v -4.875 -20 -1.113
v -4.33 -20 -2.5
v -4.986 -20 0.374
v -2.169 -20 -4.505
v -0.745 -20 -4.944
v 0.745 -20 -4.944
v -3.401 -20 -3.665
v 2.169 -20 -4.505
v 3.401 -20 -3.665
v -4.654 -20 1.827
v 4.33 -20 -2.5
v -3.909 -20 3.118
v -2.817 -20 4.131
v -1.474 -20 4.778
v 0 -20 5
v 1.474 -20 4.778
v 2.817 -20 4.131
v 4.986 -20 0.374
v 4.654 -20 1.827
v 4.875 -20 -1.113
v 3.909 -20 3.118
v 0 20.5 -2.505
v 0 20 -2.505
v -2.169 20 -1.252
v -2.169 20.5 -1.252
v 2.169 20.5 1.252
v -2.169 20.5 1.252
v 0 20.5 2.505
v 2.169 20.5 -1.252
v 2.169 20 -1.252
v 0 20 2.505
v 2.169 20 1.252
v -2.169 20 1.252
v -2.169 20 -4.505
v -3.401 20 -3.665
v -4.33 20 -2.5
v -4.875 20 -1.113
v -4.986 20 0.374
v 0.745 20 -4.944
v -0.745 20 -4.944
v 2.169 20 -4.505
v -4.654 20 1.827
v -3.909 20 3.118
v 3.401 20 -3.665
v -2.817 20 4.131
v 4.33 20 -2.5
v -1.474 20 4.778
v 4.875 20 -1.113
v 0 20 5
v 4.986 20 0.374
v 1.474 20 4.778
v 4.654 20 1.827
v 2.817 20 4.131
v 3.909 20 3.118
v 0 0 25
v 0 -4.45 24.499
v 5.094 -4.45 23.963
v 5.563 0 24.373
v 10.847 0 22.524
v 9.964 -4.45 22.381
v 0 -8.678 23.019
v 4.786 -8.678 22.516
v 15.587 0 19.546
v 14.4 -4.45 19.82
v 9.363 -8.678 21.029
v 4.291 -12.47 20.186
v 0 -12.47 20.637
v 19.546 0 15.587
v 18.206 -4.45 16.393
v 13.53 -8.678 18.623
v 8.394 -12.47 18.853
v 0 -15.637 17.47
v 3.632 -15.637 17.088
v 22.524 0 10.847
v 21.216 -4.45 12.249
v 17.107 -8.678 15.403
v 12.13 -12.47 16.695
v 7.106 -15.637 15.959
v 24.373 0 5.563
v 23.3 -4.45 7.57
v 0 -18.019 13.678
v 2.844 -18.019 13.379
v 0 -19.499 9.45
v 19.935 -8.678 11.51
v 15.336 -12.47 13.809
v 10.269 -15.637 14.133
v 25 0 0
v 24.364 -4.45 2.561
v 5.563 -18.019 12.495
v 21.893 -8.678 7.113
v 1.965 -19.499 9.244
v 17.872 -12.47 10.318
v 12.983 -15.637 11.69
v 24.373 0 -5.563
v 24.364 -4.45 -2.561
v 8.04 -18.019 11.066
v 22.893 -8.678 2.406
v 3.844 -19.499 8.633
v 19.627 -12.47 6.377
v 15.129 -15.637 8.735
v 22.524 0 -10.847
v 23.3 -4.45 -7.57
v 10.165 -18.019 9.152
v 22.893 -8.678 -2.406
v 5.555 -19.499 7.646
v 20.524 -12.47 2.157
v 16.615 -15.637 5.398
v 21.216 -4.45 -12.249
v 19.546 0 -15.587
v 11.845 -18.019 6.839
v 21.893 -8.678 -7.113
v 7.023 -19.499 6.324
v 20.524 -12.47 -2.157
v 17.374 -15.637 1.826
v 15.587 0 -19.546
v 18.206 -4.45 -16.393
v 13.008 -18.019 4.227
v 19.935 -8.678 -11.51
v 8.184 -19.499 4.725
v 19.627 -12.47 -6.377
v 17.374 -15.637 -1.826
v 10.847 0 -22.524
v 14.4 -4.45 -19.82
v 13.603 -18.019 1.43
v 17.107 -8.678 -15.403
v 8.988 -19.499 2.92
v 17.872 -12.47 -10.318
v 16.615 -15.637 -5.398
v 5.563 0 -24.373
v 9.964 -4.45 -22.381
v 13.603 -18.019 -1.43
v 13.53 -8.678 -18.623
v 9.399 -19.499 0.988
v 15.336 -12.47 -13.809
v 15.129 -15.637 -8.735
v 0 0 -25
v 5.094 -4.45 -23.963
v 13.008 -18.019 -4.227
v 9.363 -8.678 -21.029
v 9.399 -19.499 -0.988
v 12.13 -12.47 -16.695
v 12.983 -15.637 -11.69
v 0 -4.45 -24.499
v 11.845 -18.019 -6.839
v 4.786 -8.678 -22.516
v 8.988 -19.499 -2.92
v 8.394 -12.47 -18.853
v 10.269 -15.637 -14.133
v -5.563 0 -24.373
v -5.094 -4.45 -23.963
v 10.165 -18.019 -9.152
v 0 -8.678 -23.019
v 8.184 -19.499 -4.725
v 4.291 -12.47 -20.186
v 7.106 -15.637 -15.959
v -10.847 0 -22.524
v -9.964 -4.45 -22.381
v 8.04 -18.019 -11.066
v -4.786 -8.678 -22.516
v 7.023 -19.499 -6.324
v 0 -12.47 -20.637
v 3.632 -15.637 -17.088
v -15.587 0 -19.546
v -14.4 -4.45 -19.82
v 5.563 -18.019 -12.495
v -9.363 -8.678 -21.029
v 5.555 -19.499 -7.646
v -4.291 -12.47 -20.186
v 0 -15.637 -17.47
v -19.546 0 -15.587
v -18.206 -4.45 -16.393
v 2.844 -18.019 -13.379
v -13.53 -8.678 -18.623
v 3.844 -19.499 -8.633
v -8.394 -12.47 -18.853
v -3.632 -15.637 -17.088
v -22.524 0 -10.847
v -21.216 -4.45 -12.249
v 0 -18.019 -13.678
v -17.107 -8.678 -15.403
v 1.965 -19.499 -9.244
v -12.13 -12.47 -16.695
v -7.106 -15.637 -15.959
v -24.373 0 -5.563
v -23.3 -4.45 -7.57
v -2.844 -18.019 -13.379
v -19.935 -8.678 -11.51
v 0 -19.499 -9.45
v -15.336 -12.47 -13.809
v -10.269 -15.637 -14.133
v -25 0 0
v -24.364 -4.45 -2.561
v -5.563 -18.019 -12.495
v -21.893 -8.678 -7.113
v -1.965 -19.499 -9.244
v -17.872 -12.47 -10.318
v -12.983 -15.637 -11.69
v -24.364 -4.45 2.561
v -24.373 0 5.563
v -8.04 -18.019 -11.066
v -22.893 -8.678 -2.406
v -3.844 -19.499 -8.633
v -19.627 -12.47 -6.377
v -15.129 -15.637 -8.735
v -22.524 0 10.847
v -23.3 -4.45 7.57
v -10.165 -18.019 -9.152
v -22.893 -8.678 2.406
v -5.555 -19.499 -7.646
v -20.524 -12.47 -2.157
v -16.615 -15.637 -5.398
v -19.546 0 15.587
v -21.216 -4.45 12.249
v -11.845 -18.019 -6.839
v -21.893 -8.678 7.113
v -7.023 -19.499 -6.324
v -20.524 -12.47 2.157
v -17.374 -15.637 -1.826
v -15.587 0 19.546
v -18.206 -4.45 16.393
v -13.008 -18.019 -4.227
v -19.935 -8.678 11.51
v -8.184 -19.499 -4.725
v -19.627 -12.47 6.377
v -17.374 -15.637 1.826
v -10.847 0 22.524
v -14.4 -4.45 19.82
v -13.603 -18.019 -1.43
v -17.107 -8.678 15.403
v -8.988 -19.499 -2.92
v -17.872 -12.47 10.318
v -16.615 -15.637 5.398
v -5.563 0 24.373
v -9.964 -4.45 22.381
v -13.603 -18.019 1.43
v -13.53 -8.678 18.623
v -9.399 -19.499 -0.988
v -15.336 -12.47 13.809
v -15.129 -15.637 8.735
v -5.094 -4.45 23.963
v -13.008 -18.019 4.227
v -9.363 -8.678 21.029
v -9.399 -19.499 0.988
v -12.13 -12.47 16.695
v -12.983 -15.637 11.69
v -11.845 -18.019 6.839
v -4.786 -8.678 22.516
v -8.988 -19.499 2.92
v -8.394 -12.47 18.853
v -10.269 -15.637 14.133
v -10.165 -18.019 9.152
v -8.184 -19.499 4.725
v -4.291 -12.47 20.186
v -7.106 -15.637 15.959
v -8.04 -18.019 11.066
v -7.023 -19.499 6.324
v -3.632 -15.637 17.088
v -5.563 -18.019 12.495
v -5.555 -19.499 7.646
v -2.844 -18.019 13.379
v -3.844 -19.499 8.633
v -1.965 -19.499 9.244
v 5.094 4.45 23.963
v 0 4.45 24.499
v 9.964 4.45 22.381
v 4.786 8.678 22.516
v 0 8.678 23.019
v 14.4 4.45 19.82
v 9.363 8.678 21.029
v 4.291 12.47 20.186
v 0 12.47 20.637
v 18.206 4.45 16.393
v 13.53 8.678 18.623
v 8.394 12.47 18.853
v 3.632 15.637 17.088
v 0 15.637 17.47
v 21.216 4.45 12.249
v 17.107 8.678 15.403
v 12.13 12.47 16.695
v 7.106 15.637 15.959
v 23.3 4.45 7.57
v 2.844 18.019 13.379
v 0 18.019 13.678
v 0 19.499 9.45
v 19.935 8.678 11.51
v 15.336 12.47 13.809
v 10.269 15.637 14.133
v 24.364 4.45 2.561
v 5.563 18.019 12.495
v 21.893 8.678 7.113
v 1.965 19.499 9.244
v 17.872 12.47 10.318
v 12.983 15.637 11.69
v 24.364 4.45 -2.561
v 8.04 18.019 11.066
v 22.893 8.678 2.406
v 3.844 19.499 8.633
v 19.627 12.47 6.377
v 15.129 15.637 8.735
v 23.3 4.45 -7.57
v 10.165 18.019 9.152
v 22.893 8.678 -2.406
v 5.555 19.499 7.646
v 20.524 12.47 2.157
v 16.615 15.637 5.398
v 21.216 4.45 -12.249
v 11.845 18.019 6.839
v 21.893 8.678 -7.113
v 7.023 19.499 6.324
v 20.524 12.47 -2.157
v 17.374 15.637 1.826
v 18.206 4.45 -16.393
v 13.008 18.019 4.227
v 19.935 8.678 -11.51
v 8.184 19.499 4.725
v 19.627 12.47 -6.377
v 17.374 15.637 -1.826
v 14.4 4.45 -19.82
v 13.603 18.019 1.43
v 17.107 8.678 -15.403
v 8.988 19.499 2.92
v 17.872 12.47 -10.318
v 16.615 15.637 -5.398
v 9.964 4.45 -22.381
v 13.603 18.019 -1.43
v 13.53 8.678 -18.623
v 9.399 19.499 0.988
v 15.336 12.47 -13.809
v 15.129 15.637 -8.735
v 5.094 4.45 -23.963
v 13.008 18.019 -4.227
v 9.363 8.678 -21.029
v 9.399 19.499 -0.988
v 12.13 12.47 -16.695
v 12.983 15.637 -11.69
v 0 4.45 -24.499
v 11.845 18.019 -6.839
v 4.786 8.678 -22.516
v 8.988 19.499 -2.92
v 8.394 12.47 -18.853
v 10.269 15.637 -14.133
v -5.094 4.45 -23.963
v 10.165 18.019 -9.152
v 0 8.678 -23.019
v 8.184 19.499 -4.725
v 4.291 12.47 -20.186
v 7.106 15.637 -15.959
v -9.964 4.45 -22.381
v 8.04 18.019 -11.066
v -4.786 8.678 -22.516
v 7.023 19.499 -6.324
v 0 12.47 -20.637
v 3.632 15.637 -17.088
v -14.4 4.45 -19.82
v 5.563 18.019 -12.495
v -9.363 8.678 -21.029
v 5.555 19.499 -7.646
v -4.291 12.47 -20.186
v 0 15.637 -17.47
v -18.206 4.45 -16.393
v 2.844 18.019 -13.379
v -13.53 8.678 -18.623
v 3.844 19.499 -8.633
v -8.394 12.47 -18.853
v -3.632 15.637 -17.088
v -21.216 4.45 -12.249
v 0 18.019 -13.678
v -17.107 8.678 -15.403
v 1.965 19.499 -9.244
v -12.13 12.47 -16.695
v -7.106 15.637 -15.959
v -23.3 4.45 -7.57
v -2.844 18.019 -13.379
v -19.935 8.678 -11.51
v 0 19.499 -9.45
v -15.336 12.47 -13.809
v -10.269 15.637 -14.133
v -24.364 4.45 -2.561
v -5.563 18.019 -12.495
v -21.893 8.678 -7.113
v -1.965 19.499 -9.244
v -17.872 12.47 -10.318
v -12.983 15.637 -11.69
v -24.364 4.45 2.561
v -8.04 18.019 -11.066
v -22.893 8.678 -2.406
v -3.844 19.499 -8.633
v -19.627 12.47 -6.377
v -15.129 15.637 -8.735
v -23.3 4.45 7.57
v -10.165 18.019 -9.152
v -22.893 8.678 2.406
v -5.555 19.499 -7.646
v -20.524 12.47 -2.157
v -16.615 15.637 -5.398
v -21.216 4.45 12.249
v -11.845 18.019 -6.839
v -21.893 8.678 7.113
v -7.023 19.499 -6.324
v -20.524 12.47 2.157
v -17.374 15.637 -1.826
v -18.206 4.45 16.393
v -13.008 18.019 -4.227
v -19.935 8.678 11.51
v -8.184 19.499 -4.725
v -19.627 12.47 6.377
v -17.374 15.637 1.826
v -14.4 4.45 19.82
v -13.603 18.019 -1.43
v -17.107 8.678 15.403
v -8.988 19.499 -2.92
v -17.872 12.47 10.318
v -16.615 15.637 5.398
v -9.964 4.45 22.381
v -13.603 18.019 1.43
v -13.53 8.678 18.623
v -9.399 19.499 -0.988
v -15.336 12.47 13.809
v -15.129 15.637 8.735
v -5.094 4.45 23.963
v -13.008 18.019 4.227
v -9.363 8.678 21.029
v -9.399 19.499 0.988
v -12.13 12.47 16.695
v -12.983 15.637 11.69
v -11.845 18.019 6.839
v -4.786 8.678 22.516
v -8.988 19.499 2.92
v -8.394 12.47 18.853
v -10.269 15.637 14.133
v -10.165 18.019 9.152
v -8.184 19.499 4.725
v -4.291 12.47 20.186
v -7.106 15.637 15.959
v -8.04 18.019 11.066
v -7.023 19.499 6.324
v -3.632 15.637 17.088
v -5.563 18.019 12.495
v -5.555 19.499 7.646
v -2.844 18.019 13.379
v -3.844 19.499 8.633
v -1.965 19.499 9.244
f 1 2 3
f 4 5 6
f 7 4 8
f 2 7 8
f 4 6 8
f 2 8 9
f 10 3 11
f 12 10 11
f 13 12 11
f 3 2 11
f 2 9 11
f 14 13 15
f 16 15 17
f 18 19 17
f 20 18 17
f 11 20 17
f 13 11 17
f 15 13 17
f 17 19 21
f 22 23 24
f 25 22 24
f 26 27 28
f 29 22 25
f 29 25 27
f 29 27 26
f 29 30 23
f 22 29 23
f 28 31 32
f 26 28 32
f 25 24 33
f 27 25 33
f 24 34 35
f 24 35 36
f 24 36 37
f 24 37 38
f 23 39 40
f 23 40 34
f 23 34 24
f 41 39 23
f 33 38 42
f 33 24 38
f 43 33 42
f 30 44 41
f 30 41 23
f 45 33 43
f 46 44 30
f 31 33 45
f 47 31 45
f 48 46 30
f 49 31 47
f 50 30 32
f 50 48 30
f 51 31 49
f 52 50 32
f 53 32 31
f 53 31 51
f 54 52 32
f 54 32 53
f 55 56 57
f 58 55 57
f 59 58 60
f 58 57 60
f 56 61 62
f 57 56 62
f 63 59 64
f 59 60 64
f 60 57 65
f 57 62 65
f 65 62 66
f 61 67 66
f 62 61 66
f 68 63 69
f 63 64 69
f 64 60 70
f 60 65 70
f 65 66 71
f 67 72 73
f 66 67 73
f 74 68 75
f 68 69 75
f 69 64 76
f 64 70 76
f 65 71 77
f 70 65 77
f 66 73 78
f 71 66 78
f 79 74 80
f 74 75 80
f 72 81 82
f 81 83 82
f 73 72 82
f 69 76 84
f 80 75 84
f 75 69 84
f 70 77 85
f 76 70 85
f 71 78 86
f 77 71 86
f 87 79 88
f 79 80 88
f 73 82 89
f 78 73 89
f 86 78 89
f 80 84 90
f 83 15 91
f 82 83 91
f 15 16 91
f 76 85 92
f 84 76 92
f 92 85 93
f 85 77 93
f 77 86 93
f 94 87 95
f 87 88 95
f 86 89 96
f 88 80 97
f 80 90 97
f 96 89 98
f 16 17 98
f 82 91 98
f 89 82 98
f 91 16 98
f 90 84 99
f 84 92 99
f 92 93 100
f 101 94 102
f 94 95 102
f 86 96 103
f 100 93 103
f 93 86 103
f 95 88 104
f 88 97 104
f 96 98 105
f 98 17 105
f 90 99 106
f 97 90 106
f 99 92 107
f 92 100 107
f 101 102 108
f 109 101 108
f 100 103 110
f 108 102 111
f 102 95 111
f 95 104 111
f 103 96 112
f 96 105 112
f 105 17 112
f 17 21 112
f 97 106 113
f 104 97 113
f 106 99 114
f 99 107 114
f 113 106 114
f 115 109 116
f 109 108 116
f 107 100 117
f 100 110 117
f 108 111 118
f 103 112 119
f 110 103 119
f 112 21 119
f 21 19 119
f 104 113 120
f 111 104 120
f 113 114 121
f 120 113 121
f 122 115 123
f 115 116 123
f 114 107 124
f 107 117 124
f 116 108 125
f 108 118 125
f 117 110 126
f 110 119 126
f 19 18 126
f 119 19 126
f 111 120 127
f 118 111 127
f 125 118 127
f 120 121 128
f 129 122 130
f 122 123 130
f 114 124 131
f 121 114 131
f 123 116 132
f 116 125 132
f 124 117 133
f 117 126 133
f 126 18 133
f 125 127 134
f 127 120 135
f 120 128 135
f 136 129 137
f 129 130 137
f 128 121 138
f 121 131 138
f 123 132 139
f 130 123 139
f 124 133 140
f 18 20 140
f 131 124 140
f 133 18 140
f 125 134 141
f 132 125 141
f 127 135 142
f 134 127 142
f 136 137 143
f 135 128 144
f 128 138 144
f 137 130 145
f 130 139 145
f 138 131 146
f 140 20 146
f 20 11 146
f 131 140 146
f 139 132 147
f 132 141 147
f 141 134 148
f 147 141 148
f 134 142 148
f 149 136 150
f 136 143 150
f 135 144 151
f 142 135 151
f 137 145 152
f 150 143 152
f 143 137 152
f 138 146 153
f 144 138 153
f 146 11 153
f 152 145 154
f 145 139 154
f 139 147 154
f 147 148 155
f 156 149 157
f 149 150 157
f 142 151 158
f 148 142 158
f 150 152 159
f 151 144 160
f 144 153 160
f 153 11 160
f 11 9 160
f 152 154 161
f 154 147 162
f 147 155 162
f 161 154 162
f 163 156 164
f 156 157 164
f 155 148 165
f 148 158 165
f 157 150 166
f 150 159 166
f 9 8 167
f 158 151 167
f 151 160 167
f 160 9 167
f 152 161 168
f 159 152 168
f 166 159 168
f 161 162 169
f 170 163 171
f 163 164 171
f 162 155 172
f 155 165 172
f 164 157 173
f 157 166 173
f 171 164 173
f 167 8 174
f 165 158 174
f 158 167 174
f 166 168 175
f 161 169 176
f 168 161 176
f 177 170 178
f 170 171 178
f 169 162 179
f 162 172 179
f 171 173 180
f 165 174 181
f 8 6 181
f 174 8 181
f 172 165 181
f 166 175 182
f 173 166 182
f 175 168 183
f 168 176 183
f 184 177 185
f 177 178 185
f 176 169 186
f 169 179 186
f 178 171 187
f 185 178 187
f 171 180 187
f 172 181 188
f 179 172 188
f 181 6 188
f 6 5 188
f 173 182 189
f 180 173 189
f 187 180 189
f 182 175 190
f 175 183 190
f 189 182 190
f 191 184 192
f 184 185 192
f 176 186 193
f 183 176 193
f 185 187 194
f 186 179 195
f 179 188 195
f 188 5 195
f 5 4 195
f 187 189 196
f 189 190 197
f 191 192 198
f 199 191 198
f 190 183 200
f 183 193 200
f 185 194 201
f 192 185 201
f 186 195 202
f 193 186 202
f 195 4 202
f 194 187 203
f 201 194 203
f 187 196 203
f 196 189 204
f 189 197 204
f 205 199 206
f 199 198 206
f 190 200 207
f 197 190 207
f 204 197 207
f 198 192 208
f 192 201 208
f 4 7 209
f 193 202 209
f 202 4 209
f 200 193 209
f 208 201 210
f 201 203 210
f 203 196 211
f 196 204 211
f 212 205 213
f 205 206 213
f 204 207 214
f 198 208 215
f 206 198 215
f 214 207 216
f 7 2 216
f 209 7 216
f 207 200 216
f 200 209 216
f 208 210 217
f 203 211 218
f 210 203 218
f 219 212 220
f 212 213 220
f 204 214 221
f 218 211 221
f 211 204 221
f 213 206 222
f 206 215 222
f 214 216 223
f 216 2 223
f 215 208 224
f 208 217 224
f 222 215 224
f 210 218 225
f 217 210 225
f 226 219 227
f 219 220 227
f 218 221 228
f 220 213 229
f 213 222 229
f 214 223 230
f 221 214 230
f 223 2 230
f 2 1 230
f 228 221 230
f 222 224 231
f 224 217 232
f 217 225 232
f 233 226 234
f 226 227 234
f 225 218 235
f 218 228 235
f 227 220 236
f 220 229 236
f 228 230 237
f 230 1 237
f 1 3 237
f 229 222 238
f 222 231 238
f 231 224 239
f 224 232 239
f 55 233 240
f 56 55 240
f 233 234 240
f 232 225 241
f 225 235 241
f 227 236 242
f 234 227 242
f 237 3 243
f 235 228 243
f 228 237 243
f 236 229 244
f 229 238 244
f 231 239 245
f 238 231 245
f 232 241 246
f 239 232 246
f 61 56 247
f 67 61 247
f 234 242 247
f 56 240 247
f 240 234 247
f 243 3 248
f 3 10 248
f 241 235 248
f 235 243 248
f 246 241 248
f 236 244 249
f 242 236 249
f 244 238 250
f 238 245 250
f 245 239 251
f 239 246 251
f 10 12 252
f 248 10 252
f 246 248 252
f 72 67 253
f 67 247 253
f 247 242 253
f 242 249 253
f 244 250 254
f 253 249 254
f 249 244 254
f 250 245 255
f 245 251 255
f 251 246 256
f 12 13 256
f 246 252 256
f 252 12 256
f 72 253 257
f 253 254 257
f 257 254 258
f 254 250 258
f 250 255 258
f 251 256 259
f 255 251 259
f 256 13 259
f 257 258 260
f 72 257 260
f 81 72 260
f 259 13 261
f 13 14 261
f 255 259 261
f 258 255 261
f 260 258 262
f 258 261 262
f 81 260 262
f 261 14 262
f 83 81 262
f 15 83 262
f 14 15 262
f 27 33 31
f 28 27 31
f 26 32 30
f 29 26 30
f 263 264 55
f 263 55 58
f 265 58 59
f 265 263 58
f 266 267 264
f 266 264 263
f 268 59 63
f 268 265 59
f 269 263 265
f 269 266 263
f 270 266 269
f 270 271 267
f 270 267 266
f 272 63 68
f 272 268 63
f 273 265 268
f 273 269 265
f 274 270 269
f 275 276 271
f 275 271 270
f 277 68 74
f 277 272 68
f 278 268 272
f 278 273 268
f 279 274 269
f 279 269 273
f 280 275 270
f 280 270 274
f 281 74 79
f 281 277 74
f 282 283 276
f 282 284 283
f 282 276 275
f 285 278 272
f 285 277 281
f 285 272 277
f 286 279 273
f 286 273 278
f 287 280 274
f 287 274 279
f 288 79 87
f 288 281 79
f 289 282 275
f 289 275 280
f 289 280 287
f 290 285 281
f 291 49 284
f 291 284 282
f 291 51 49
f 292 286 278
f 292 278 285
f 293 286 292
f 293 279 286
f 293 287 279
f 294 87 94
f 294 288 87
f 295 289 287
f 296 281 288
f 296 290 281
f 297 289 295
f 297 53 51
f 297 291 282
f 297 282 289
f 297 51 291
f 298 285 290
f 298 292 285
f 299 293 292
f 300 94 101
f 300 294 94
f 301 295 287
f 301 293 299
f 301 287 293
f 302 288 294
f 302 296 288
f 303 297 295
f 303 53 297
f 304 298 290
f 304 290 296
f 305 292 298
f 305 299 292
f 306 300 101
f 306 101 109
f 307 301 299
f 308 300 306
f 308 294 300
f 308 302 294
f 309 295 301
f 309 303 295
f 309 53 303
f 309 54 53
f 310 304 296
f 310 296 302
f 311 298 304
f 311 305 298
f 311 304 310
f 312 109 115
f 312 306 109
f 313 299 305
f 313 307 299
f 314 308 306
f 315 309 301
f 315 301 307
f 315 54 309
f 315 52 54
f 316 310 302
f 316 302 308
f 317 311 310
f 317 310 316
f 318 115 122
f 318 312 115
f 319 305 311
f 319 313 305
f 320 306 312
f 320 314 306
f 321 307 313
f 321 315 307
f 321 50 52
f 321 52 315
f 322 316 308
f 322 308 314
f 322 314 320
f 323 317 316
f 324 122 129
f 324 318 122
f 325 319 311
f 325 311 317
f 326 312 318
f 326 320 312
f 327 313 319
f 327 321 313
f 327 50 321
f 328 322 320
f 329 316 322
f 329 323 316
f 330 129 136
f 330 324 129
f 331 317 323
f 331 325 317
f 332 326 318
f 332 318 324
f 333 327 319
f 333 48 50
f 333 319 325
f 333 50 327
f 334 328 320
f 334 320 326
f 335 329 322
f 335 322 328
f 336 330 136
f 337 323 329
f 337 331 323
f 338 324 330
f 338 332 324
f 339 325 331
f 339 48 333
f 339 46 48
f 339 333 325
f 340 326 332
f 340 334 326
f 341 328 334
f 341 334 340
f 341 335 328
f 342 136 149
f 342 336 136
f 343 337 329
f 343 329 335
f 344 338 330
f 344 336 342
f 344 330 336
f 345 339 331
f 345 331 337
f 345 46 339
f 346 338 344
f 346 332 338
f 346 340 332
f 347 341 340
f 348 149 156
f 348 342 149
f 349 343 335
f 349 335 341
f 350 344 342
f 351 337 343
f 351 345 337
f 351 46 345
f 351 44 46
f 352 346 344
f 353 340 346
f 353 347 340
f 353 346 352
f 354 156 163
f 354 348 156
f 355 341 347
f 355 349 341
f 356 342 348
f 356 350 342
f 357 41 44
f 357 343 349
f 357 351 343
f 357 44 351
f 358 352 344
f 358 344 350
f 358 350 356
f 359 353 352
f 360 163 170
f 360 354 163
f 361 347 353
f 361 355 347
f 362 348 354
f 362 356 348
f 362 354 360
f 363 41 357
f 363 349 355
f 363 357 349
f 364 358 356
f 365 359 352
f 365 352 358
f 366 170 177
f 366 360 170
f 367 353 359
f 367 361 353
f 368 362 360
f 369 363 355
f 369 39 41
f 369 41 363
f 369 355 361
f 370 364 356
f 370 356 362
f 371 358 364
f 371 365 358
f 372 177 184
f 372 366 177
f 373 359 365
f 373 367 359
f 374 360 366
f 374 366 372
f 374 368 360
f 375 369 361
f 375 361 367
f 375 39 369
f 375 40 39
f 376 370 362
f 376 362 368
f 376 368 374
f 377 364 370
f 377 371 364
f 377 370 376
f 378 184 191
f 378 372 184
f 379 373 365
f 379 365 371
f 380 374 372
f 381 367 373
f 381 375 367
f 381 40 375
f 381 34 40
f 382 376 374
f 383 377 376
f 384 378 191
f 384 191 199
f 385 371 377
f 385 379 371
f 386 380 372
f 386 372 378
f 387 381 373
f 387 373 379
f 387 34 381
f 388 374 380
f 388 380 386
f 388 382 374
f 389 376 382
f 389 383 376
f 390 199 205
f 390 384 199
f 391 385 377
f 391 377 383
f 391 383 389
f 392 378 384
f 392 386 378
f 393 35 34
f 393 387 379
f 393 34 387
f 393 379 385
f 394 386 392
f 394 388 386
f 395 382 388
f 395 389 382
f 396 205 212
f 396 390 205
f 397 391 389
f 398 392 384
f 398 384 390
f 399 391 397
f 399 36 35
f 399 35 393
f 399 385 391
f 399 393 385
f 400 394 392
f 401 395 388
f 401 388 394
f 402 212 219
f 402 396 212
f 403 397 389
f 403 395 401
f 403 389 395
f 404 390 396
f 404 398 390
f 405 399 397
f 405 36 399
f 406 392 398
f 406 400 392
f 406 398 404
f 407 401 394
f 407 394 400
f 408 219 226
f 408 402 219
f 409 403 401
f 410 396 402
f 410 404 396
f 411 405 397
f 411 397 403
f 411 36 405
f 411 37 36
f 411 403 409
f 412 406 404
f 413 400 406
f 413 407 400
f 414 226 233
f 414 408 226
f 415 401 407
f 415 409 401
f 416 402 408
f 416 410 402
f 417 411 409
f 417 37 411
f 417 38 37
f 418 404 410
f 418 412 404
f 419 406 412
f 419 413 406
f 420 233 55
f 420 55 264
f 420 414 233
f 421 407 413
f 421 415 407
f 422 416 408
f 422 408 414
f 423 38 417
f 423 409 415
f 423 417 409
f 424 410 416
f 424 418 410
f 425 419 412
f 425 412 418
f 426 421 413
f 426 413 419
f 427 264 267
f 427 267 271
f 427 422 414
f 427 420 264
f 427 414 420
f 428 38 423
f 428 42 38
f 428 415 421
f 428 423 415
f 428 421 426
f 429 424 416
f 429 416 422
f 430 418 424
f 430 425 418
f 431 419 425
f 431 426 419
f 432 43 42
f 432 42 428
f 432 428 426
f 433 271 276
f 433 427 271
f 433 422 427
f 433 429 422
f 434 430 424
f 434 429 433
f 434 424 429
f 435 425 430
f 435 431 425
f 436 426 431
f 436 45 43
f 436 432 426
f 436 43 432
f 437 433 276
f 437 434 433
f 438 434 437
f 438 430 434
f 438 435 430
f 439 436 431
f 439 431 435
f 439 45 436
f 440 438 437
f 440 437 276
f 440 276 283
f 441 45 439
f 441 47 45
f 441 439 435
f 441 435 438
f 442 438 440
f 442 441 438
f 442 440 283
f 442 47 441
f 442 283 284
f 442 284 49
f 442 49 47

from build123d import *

# Parameters (mm, degrees)
SKETCH2_R           = 25
BOSS_EXTRUDE5_DEPTH = 20
FILLET8_R           = 20
BOSS_EXTRUDE6_DEPTH = 0.5


with BuildPart() as part:
    # Sketch2 → Boss-Extrude5 (new, symmetric)
    with BuildSketch(Plane(origin=(0, 0, 0), x_dir=(1, 0, 0), z_dir=(0, 1, 0))):
        with Locations(Location((0, 0, 0), (0, 0, 270))):
            Circle(SKETCH2_R)
    extrude(amount=BOSS_EXTRUDE5_DEPTH, both=True)

    # Fillet8
    fillet8_edges = [part.edges().sort_by_distance(p)[0] for p in [
        (0, -20, -25),
        (0, 20, -25),
    ]]
    fillet(fillet8_edges, radius=FILLET8_R - 0.0001)  # a hair under: the kernel refuses the full size

    # Sketch3 → Boss-Extrude6 (add)
    with BuildSketch(Plane(origin=(0, 20, 0), x_dir=(1, 0, 0), z_dir=(0, 1, 0))):
        Polygon((0, 2.504821992), (-2.169239477, 1.252410996), (-2.169239477, -1.252410996), (0, -2.504821992), (2.169239477, -1.252410996), (2.169239477, 1.252410996), align=None)
    extrude(amount=BOSS_EXTRUDE6_DEPTH)


solid = part.part
